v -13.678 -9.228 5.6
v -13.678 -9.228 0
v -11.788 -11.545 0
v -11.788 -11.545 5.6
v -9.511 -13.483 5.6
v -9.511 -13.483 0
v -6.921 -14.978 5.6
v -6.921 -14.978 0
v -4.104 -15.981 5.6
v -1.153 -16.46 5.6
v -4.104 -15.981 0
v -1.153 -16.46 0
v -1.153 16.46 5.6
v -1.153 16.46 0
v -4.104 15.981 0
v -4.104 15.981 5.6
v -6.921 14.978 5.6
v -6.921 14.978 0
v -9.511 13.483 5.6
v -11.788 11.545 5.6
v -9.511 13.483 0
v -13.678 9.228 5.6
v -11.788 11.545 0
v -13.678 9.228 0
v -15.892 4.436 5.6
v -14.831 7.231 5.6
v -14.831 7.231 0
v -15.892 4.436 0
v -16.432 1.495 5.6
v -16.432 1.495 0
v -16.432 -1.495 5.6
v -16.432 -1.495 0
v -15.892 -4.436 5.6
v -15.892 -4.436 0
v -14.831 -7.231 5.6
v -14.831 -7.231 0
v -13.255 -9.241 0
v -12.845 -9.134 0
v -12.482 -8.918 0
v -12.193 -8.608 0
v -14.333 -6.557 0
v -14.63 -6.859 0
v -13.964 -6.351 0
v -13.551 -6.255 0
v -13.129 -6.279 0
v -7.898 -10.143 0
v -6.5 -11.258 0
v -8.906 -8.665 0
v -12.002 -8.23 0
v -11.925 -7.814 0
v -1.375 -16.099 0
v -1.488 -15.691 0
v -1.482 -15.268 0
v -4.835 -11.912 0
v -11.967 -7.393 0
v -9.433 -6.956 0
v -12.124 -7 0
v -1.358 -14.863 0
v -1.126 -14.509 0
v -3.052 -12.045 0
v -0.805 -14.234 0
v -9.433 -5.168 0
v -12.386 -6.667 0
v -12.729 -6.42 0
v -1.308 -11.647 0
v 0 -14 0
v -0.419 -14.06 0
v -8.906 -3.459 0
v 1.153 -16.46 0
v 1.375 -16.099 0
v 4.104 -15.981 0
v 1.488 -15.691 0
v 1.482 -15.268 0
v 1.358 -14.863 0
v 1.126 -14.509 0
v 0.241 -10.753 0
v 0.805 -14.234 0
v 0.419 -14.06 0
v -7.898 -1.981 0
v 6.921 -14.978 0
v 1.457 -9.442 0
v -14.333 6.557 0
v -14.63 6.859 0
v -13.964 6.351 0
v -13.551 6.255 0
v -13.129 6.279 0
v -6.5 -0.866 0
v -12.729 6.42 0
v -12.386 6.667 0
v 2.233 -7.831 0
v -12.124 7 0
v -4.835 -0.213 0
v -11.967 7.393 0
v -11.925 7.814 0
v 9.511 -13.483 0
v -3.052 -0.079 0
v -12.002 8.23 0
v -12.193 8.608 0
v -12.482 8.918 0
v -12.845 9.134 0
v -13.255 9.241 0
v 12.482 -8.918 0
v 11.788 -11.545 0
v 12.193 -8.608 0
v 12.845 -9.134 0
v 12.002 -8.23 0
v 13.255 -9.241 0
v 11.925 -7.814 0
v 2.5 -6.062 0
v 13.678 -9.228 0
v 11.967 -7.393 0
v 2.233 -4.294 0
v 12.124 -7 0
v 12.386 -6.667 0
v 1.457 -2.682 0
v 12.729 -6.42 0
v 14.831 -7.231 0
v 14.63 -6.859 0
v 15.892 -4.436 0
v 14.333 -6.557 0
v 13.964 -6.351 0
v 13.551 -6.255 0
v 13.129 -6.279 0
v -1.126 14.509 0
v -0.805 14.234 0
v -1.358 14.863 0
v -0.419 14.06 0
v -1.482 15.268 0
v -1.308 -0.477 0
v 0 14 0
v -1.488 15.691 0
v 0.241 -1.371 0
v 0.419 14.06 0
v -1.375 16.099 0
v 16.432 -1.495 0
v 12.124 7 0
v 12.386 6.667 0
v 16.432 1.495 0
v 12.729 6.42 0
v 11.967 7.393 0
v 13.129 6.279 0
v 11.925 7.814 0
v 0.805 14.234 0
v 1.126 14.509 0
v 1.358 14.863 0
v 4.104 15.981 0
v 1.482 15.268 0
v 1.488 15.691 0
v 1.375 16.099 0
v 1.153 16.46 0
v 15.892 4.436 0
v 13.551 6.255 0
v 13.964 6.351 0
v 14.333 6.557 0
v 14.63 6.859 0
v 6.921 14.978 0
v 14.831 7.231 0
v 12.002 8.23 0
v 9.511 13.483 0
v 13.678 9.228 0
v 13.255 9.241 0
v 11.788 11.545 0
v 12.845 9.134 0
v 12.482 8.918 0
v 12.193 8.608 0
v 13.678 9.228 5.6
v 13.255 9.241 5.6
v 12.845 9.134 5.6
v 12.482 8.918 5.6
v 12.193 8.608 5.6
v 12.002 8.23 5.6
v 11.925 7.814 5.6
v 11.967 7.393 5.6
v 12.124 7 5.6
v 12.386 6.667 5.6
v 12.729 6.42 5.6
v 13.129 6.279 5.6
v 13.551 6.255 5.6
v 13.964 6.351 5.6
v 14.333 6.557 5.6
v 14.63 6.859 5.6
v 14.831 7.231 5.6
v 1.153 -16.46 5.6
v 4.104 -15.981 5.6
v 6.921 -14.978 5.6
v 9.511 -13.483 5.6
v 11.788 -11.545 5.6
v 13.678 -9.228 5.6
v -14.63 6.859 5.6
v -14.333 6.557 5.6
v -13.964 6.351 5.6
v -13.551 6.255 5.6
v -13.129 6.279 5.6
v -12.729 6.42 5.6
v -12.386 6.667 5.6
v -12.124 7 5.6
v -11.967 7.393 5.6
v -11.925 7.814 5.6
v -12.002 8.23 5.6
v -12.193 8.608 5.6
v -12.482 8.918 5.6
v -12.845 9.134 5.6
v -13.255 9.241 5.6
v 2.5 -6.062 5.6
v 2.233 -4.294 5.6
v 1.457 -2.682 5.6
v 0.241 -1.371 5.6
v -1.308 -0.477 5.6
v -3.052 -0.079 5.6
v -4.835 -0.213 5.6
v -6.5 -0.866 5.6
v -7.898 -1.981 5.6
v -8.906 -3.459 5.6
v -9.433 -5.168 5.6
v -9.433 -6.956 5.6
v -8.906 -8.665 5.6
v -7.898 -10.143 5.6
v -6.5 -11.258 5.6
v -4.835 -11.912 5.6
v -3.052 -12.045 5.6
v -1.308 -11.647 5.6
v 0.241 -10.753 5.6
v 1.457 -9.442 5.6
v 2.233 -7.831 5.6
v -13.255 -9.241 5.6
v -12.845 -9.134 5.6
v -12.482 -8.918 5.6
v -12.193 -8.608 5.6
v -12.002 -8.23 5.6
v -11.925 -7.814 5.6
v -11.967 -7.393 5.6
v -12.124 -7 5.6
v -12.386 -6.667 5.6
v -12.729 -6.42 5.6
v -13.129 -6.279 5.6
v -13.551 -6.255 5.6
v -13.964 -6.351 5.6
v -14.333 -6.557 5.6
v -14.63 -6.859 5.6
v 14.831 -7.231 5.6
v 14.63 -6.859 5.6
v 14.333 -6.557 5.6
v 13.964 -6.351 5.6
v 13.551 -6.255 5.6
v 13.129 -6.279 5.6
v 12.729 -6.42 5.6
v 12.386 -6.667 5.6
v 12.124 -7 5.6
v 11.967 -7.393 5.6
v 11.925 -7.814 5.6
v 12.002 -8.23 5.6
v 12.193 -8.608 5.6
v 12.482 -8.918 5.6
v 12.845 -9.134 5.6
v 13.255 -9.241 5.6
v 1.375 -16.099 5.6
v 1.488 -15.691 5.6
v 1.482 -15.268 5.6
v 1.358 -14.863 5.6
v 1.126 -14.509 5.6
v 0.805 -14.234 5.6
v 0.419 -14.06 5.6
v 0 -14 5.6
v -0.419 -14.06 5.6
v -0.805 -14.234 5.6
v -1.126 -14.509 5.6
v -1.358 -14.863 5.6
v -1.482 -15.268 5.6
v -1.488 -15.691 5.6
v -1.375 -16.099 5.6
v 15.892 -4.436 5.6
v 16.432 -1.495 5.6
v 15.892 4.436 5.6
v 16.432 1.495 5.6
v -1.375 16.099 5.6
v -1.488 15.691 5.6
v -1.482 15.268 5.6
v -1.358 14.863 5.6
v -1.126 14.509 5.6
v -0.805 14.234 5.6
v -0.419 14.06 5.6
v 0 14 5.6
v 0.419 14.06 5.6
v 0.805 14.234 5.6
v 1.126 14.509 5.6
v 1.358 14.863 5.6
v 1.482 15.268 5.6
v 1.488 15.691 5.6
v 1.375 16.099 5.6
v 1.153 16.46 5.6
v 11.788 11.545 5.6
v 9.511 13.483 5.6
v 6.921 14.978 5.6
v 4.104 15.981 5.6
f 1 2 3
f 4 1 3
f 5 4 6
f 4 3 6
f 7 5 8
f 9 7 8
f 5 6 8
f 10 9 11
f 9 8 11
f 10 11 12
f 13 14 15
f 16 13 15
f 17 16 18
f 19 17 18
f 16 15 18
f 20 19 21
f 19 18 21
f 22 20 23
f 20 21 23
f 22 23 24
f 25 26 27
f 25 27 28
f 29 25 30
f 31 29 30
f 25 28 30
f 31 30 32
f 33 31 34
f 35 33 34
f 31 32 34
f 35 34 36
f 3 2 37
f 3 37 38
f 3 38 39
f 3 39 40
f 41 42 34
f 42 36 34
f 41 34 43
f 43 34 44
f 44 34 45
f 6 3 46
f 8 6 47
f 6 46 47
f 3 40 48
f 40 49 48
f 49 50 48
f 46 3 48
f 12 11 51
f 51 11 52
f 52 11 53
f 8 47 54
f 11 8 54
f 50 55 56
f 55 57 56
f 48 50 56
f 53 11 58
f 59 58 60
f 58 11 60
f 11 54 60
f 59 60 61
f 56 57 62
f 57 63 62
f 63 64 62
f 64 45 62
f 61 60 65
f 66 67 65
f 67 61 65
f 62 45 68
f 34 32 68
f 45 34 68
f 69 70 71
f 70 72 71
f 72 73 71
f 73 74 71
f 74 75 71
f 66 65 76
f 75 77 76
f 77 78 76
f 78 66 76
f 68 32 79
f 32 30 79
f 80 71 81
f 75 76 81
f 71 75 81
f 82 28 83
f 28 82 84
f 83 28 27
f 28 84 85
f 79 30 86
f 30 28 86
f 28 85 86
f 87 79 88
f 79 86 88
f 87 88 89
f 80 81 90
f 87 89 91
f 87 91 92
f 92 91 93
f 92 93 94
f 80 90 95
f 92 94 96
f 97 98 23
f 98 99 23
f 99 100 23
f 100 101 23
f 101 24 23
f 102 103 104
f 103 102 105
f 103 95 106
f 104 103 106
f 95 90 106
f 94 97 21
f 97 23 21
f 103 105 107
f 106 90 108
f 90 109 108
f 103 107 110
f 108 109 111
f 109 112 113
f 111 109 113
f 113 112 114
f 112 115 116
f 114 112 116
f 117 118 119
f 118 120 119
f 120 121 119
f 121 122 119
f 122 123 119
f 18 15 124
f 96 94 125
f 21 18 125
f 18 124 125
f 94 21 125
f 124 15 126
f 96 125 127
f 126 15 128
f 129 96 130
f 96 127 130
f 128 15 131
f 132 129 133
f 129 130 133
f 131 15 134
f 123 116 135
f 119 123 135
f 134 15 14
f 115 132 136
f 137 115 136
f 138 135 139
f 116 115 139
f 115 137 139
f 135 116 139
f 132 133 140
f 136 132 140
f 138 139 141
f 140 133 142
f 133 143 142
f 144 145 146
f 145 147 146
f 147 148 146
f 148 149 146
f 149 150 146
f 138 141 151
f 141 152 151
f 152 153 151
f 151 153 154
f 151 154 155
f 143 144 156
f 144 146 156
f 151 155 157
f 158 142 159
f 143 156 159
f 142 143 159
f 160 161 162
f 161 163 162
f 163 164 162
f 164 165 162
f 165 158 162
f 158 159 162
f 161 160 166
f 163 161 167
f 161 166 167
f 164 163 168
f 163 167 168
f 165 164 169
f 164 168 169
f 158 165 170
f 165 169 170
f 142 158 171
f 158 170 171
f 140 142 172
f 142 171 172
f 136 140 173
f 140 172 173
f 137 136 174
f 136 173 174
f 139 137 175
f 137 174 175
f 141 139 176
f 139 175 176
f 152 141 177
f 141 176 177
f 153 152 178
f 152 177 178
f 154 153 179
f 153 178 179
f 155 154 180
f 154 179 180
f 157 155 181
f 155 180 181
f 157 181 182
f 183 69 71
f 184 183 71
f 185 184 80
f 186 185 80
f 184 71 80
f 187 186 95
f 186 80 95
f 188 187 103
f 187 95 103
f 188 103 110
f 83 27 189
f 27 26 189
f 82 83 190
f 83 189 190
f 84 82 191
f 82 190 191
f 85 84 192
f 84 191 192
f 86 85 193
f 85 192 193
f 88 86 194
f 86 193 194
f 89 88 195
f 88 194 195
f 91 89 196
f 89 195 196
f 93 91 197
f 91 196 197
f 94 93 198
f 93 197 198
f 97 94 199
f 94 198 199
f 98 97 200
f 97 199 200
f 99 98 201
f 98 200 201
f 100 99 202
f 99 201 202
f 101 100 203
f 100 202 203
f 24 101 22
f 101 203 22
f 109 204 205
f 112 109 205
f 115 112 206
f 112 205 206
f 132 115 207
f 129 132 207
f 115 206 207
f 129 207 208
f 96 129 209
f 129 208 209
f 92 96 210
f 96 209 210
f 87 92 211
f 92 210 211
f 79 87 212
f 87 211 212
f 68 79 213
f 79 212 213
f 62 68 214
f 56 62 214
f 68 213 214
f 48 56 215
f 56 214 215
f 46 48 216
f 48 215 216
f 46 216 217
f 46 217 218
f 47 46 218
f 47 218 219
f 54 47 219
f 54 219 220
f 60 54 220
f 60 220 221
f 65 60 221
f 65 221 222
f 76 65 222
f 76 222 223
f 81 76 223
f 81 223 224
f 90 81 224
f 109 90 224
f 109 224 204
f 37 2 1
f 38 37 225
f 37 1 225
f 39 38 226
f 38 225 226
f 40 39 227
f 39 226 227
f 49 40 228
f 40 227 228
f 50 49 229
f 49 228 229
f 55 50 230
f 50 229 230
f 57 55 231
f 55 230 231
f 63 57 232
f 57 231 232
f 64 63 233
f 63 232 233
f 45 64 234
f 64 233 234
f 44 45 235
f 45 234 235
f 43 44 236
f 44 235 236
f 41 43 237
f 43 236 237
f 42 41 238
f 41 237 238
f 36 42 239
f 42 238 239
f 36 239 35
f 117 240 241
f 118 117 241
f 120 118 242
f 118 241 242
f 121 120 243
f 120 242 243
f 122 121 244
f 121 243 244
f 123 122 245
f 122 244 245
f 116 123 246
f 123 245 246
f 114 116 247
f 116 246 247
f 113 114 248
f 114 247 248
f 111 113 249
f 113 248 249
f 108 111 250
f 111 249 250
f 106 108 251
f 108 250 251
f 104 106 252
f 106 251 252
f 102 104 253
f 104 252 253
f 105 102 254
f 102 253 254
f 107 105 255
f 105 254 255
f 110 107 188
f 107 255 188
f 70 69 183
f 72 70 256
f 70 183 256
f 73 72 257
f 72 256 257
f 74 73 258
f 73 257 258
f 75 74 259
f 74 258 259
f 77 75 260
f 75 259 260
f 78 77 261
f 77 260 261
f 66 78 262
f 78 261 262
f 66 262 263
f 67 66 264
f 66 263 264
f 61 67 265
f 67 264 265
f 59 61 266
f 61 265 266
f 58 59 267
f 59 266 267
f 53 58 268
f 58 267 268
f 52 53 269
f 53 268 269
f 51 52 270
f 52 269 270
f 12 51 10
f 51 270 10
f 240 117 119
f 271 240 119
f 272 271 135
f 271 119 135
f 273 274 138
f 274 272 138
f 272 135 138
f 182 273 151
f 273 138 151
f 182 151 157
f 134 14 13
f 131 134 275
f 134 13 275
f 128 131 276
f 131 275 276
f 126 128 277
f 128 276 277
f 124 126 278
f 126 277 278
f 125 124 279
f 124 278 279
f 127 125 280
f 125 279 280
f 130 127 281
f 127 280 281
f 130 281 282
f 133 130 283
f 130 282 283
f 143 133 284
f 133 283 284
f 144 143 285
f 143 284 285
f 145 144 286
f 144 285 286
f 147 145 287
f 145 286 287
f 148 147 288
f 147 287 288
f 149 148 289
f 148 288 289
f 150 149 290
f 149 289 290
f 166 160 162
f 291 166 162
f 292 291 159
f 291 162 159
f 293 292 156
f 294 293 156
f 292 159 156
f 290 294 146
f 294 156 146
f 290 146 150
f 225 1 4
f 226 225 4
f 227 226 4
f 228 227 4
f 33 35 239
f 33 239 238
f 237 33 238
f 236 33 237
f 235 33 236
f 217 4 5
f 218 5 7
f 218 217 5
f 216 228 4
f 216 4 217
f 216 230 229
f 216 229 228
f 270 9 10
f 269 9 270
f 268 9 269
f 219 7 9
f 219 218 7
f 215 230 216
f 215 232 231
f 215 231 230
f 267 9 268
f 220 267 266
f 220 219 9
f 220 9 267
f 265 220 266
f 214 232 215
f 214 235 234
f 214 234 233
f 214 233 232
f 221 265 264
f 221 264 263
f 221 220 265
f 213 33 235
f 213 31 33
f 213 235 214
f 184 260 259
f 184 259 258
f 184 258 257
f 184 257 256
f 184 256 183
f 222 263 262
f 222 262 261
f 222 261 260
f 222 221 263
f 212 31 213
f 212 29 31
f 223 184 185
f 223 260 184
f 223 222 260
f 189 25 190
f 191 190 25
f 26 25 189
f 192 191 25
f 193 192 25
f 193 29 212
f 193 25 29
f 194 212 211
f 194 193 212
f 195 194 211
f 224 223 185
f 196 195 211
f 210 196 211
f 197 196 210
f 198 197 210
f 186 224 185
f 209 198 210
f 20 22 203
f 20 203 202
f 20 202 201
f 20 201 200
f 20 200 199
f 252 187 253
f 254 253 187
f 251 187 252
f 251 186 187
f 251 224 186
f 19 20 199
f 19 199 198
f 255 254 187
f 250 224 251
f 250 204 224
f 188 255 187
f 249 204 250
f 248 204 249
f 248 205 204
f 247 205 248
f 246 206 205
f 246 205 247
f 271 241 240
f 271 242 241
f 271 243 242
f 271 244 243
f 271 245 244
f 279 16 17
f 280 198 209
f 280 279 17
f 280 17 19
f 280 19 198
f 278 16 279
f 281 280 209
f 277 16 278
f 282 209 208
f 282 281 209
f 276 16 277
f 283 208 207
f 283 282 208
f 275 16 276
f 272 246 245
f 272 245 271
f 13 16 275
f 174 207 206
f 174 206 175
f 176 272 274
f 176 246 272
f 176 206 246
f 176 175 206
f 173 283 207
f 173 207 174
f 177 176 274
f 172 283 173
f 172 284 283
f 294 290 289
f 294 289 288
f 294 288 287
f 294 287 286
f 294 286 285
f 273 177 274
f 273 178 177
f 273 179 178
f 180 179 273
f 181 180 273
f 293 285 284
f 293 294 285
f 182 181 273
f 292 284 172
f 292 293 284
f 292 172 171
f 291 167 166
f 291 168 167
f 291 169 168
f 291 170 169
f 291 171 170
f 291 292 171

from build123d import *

# Parameters (mm, degrees)
SKETCH1_R           = 16.5
BOSS_EXTRUDE1_DEPTH = 5.6
SKETCH2_R           = 1.5
CUT_EXTRUDE1_DEPTH  = 24.997083156
SKETCH3_R           = 6
CUT_EXTRUDE2_DEPTH  = 24.969375894


with BuildPart() as part:
    # Sketch1 → Boss-Extrude1 (new body)
    with BuildSketch(Plane.XY):
        Circle(SKETCH1_R)
    extrude(amount=BOSS_EXTRUDE1_DEPTH)

    # Sketch2 → Cut-Extrude1 (cut, through all)
    with BuildSketch(Plane.XY.offset(5.6)):
        with Locations((0, 15.5)):
            Circle(SKETCH2_R)
        with Locations((13.423393759, 7.75)):
            Circle(SKETCH2_R)
        with Locations((13.423393759, -7.75)):
            Circle(SKETCH2_R)
        with Locations((0, -15.5)):
            Circle(SKETCH2_R)
        with Locations((-13.423393759, -7.75)):
            Circle(SKETCH2_R)
        with Locations((-13.423393759, 7.75)):
            Circle(SKETCH2_R)
    extrude(amount=-CUT_EXTRUDE1_DEPTH, mode=Mode.SUBTRACT)

    # Sketch3 → Cut-Extrude2 (cut, through all)
    with BuildSketch(Plane.XY.offset(5.6)):
        with Locations((-3.5, -6.062177826)):
            Circle(SKETCH3_R)
    extrude(amount=-CUT_EXTRUDE2_DEPTH, mode=Mode.SUBTRACT)


solid = part.part
